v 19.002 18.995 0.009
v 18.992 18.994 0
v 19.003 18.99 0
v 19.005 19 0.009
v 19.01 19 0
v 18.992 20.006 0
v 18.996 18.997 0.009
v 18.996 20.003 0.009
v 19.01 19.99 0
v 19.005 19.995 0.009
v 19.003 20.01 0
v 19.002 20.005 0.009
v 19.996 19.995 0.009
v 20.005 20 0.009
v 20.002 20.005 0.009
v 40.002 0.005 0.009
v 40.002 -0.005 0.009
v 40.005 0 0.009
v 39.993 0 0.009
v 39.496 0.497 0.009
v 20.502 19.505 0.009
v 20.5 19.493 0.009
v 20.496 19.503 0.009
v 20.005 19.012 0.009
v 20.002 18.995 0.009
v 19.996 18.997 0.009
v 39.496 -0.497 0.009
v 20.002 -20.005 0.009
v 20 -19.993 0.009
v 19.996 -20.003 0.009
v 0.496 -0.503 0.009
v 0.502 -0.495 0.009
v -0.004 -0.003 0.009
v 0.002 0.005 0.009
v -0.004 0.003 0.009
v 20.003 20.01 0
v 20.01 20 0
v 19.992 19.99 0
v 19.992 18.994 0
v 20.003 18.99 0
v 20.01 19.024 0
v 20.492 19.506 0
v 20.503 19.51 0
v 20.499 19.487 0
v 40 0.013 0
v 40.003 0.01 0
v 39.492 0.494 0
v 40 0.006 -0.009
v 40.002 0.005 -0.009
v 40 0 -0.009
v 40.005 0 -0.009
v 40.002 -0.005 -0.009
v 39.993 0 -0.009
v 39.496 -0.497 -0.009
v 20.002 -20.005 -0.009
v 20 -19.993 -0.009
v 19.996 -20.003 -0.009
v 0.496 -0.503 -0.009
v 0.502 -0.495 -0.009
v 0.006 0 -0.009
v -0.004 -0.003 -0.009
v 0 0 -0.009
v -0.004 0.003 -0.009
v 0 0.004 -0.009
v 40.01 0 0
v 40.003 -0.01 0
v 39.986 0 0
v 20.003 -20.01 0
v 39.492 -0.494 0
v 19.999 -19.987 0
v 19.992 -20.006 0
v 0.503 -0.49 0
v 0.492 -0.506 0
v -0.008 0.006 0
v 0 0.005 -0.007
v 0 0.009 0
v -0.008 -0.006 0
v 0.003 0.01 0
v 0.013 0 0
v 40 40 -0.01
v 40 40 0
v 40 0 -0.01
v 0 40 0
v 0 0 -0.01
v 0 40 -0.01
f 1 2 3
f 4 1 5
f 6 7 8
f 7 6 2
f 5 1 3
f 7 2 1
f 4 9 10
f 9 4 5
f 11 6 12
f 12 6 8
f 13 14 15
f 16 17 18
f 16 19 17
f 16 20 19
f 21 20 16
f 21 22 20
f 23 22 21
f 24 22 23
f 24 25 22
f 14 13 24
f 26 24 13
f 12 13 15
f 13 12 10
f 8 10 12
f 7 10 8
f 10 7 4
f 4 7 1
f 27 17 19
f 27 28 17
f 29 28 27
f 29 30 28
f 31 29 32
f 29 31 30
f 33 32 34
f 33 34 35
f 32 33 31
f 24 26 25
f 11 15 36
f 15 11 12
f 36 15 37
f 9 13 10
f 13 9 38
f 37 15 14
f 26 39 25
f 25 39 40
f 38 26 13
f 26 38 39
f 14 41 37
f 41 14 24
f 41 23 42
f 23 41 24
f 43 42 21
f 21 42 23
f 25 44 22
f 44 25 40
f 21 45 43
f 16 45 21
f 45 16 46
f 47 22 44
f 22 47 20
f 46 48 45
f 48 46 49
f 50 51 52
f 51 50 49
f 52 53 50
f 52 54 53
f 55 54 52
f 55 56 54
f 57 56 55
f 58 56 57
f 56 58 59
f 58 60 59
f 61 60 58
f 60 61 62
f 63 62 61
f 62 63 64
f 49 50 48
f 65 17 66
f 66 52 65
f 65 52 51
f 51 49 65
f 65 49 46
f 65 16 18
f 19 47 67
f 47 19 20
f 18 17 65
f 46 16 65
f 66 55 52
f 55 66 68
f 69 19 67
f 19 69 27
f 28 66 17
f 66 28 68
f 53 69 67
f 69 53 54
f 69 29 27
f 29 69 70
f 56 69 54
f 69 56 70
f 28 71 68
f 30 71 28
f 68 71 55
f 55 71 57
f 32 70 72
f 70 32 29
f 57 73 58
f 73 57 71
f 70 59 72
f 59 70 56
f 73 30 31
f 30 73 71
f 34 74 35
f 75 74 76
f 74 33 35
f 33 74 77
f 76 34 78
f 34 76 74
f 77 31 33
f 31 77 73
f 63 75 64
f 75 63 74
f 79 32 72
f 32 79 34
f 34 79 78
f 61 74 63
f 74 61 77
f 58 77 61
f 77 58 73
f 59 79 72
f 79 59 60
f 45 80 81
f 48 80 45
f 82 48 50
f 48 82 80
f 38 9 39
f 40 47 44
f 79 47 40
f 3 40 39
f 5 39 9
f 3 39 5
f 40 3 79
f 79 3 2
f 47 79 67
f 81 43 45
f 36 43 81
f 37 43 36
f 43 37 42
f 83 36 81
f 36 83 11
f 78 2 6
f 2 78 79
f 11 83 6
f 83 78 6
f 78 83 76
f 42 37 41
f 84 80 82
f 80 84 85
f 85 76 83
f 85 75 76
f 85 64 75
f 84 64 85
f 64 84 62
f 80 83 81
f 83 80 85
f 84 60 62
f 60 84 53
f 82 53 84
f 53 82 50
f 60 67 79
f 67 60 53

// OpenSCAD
hull(){
    translate([19, 19]) sphere(0.01);
    translate([19, 20]) sphere(0.01);
}
hull(){
    translate([19, 20]) sphere(0.01);
    translate([20, 20]) sphere(0.01);
}
hull(){
    translate([20, 20]) sphere(0.01);
    translate([20, 19]) sphere(0.01);
}
hull(){
    translate([20, 19]) sphere(0.01);
    translate([20.5, 19.5]) sphere(0.01);
}
hull(){
    translate([20.5, 19.5]) sphere(0.01);
    translate([21, 19]) sphere(0.01);
}
hull(){
    translate([21, 19]) sphere(0.01);
    translate([21.5, 18.5]) sphere(0.01);
}
hull(){
    translate([21.5, 18.5]) sphere(0.01);
    translate([22, 18]) sphere(0.01);
}
hull(){
    translate([22, 18]) sphere(0.01);
    translate([22.5, 17.5]) sphere(0.01);
}
hull(){
    translate([22.5, 17.5]) sphere(0.01);
    translate([23, 17]) sphere(0.01);
}
hull(){
    translate([23, 17]) sphere(0.01);
    translate([23.5, 16.5]) sphere(0.01);
}
hull(){
    translate([23.5, 16.5]) sphere(0.01);
    translate([24, 16]) sphere(0.01);
}
hull(){
    translate([24, 16]) sphere(0.01);
    translate([24.5, 15.5]) sphere(0.01);
}
hull(){
    translate([24.5, 15.5]) sphere(0.01);
    translate([25, 15]) sphere(0.01);
}
hull(){
    translate([25, 15]) sphere(0.01);
    translate([25.5, 14.5]) sphere(0.01);
}
hull(){
    translate([25.5, 14.5]) sphere(0.01);
    translate([26, 14]) sphere(0.01);
}
hull(){
    translate([26, 14]) sphere(0.01);
    translate([26.5, 13.5]) sphere(0.01);
}
hull(){
    translate([26.5, 13.5]) sphere(0.01);
    translate([27, 13]) sphere(0.01);
}
hull(){
    translate([27, 13]) sphere(0.01);
    translate([27.5, 12.5]) sphere(0.01);
}
hull(){
    translate([27.5, 12.5]) sphere(0.01);
    translate([28, 12]) sphere(0.01);
}
hull(){
    translate([28, 12]) sphere(0.01);
    translate([28.5, 11.5]) sphere(0.01);
}
hull(){
    translate([28.5, 11.5]) sphere(0.01);
    translate([29, 11]) sphere(0.01);
}
hull(){
    translate([29, 11]) sphere(0.01);
    translate([29.5, 10.5]) sphere(0.01);
}
hull(){
    translate([29.5, 10.5]) sphere(0.01);
    translate([30, 10]) sphere(0.01);
}
hull(){
    translate([30, 10]) sphere(0.01);
    translate([30.5, 9.5]) sphere(0.01);
}
hull(){
    translate([30.5, 9.5]) sphere(0.01);
    translate([31, 9]) sphere(0.01);
}
hull(){
    translate([31, 9]) sphere(0.01);
    translate([31.5, 8.5]) sphere(0.01);
}
hull(){
    translate([31.5, 8.5]) sphere(0.01);
    translate([32, 8]) sphere(0.01);
}
hull(){
    translate([32, 8]) sphere(0.01);
    translate([32.5, 7.5]) sphere(0.01);
}
hull(){
    translate([32.5, 7.5]) sphere(0.01);
    translate([33, 7]) sphere(0.01);
}
hull(){
    translate([33, 7]) sphere(0.01);
    translate([33.5, 6.5]) sphere(0.01);
}
hull(){
    translate([33.5, 6.5]) sphere(0.01);
    translate([34, 6]) sphere(0.01);
}
hull(){
    translate([34, 6]) sphere(0.01);
    translate([34.5, 5.5]) sphere(0.01);
}
hull(){
    translate([34.5, 5.5]) sphere(0.01);
    translate([35, 5]) sphere(0.01);
}
hull(){
    translate([35, 5]) sphere(0.01);
    translate([35.5, 4.5]) sphere(0.01);
}
hull(){
    translate([35.5, 4.5]) sphere(0.01);
    translate([36, 4]) sphere(0.01);
}
hull(){
    translate([36, 4]) sphere(0.01);
    translate([36.5, 3.5]) sphere(0.01);
}
hull(){
    translate([36.5, 3.5]) sphere(0.01);
    translate([37, 3]) sphere(0.01);
}
hull(){
    translate([37, 3]) sphere(0.01);
    translate([37.5, 2.5]) sphere(0.01);
}
hull(){
    translate([37.5, 2.5]) sphere(0.01);
    translate([38, 2]) sphere(0.01);
}
hull(){
    translate([38, 2]) sphere(0.01);
    translate([38.5, 1.5]) sphere(0.01);
}
hull(){
    translate([38.5, 1.5]) sphere(0.01);
    translate([39, 1]) sphere(0.01);
}
hull(){
    translate([39, 1]) sphere(0.01);
    translate([39.5, 0.5]) sphere(0.01);
}
hull(){
    translate([39.5, 0.5]) sphere(0.01);
    translate([40, 0]) sphere(0.01);
}
hull(){
    translate([40, 0]) sphere(0.01);
    translate([39.5, -0.5]) sphere(0.01);
}
hull(){
    translate([39.5, -0.5]) sphere(0.01);
    translate([39, -1]) sphere(0.01);
}
hull(){
    translate([39, -1]) sphere(0.01);
    translate([38.5, -1.5]) sphere(0.01);
}
hull(){
    translate([38.5, -1.5]) sphere(0.01);
    translate([38, -2]) sphere(0.01);
}
hull(){
    translate([38, -2]) sphere(0.01);
    translate([37.5, -2.5]) sphere(0.01);
}
hull(){
    translate([37.5, -2.5]) sphere(0.01);
    translate([37, -3]) sphere(0.01);
}
hull(){
    translate([37, -3]) sphere(0.01);
    translate([36.5, -3.5]) sphere(0.01);
}
hull(){
    translate([36.5, -3.5]) sphere(0.01);
    translate([36, -4]) sphere(0.01);
}
hull(){
    translate([36, -4]) sphere(0.01);
    translate([35.5, -4.5]) sphere(0.01);
}
hull(){
    translate([35.5, -4.5]) sphere(0.01);
    translate([35, -5]) sphere(0.01);
}
hull(){
    translate([35, -5]) sphere(0.01);
    translate([34.5, -5.5]) sphere(0.01);
}
hull(){
    translate([34.5, -5.5]) sphere(0.01);
    translate([34, -6]) sphere(0.01);
}
hull(){
    translate([34, -6]) sphere(0.01);
    translate([33.5, -6.5]) sphere(0.01);
}
hull(){
    translate([33.5, -6.5]) sphere(0.01);
    translate([33, -7]) sphere(0.01);
}
hull(){
    translate([33, -7]) sphere(0.01);
    translate([32.5, -7.5]) sphere(0.01);
}
hull(){
    translate([32.5, -7.5]) sphere(0.01);
    translate([32, -8]) sphere(0.01);
}
hull(){
    translate([32, -8]) sphere(0.01);
    translate([31.5, -8.5]) sphere(0.01);
}
hull(){
    translate([31.5, -8.5]) sphere(0.01);
    translate([31, -9]) sphere(0.01);
}
hull(){
    translate([31, -9]) sphere(0.01);
    translate([30.5, -9.5]) sphere(0.01);
}
hull(){
    translate([30.5, -9.5]) sphere(0.01);
    translate([30, -10]) sphere(0.01);
}
hull(){
    translate([30, -10]) sphere(0.01);
    translate([29.5, -10.5]) sphere(0.01);
}
hull(){
    translate([29.5, -10.5]) sphere(0.01);
    translate([29, -11]) sphere(0.01);
}
hull(){
    translate([29, -11]) sphere(0.01);
    translate([28.5, -11.5]) sphere(0.01);
}
hull(){
    translate([28.5, -11.5]) sphere(0.01);
    translate([28, -12]) sphere(0.01);
}
hull(){
    translate([28, -12]) sphere(0.01);
    translate([27.5, -12.5]) sphere(0.01);
}
hull(){
    translate([27.5, -12.5]) sphere(0.01);
    translate([27, -13]) sphere(0.01);
}
hull(){
    translate([27, -13]) sphere(0.01);
    translate([26.5, -13.5]) sphere(0.01);
}
hull(){
    translate([26.5, -13.5]) sphere(0.01);
    translate([26, -14]) sphere(0.01);
}
hull(){
    translate([26, -14]) sphere(0.01);
    translate([25.5, -14.5]) sphere(0.01);
}
hull(){
    translate([25.5, -14.5]) sphere(0.01);
    translate([25, -15]) sphere(0.01);
}
hull(){
    translate([25, -15]) sphere(0.01);
    translate([24.5, -15.5]) sphere(0.01);
}
hull(){
    translate([24.5, -15.5]) sphere(0.01);
    translate([24, -16]) sphere(0.01);
}
hull(){
    translate([24, -16]) sphere(0.01);
    translate([23.5, -16.5]) sphere(0.01);
}
hull(){
    translate([23.5, -16.5]) sphere(0.01);
    translate([23, -17]) sphere(0.01);
}
hull(){
    translate([23, -17]) sphere(0.01);
    translate([22.5, -17.5]) sphere(0.01);
}
hull(){
    translate([22.5, -17.5]) sphere(0.01);
    translate([22, -18]) sphere(0.01);
}
hull(){
    translate([22, -18]) sphere(0.01);
    translate([21.5, -18.5]) sphere(0.01);
}
hull(){
    translate([21.5, -18.5]) sphere(0.01);
    translate([21, -19]) sphere(0.01);
}
hull(){
    translate([21, -19]) sphere(0.01);
    translate([20.5, -19.5]) sphere(0.01);
}
hull(){
    translate([20.5, -19.5]) sphere(0.01);
    translate([20, -20]) sphere(0.01);
}
hull(){
    translate([20, -20]) sphere(0.01);
    translate([19.5, -19.5]) sphere(0.01);
}
hull(){
    translate([19.5, -19.5]) sphere(0.01);
    translate([19, -19]) sphere(0.01);
}
hull(){
    translate([19, -19]) sphere(0.01);
    translate([18.5, -18.5]) sphere(0.01);
}
hull(){
    translate([18.5, -18.5]) sphere(0.01);
    translate([18, -18]) sphere(0.01);
}
hull(){
    translate([18, -18]) sphere(0.01);
    translate([17.5, -17.5]) sphere(0.01);
}
hull(){
    translate([17.5, -17.5]) sphere(0.01);
    translate([17, -17]) sphere(0.01);
}
hull(){
    translate([17, -17]) sphere(0.01);
    translate([16.5, -16.5]) sphere(0.01);
}
hull(){
    translate([16.5, -16.5]) sphere(0.01);
    translate([16, -16]) sphere(0.01);
}
hull(){
    translate([16, -16]) sphere(0.01);
    translate([15.5, -15.5]) sphere(0.01);
}
hull(){
    translate([15.5, -15.5]) sphere(0.01);
    translate([15, -15]) sphere(0.01);
}
hull(){
    translate([15, -15]) sphere(0.01);
    translate([14.5, -14.5]) sphere(0.01);
}
hull(){
    translate([14.5, -14.5]) sphere(0.01);
    translate([14, -14]) sphere(0.01);
}
hull(){
    translate([14, -14]) sphere(0.01);
    translate([13.5, -13.5]) sphere(0.01);
}
hull(){
    translate([13.5, -13.5]) sphere(0.01);
    translate([13, -13]) sphere(0.01);
}
hull(){
    translate([13, -13]) sphere(0.01);
    translate([12.5, -12.5]) sphere(0.01);
}
hull(){
    translate([12.5, -12.5]) sphere(0.01);
    translate([12, -12]) sphere(0.01);
}
hull(){
    translate([12, -12]) sphere(0.01);
    translate([11.5, -11.5]) sphere(0.01);
}
hull(){
    translate([11.5, -11.5]) sphere(0.01);
    translate([11, -11]) sphere(0.01);
}
hull(){
    translate([11, -11]) sphere(0.01);
    translate([10.5, -10.5]) sphere(0.01);
}
hull(){
    translate([10.5, -10.5]) sphere(0.01);
    translate([10, -10]) sphere(0.01);
}
hull(){
    translate([10, -10]) sphere(0.01);
    translate([9.5, -9.5]) sphere(0.01);
}
hull(){
    translate([9.5, -9.5]) sphere(0.01);
    translate([9, -9]) sphere(0.01);
}
hull(){
    translate([9, -9]) sphere(0.01);
    translate([8.5, -8.5]) sphere(0.01);
}
hull(){
    translate([8.5, -8.5]) sphere(0.01);
    translate([8, -8]) sphere(0.01);
}
hull(){
    translate([8, -8]) sphere(0.01);
    translate([7.5, -7.5]) sphere(0.01);
}
hull(){
    translate([7.5, -7.5]) sphere(0.01);
    translate([7, -7]) sphere(0.01);
}
hull(){
    translate([7, -7]) sphere(0.01);
    translate([6.5, -6.5]) sphere(0.01);
}
hull(){
    translate([6.5, -6.5]) sphere(0.01);
    translate([6, -6]) sphere(0.01);
}
hull(){
    translate([6, -6]) sphere(0.01);
    translate([5.5, -5.5]) sphere(0.01);
}
hull(){
    translate([5.5, -5.5]) sphere(0.01);
    translate([5, -5]) sphere(0.01);
}
hull(){
    translate([5, -5]) sphere(0.01);
    translate([4.5, -4.5]) sphere(0.01);
}
hull(){
    translate([4.5, -4.5]) sphere(0.01);
    translate([4, -4]) sphere(0.01);
}
hull(){
    translate([4, -4]) sphere(0.01);
    translate([3.5, -3.5]) sphere(0.01);
}
hull(){
    translate([3.5, -3.5]) sphere(0.01);
    translate([3, -3]) sphere(0.01);
}
hull(){
    translate([3, -3]) sphere(0.01);
    translate([2.5, -2.5]) sphere(0.01);
}
hull(){
    translate([2.5, -2.5]) sphere(0.01);
    translate([2, -2]) sphere(0.01);
}
hull(){
    translate([2, -2]) sphere(0.01);
    translate([1.5, -1.5]) sphere(0.01);
}
hull(){
    translate([1.5, -1.5]) sphere(0.01);
    translate([1, -1]) sphere(0.01);
}
hull(){
    translate([1, -1]) sphere(0.01);
    translate([0.5, -0.5]) sphere(0.01);
}
hull(){
    translate([0.5, -0.5]) sphere(0.01);
    translate([0, 0]) sphere(0.01);
}
translate([0,0,-0.01]) color([0.1,0.1,0.1]) cube([40,40,0.01]);
